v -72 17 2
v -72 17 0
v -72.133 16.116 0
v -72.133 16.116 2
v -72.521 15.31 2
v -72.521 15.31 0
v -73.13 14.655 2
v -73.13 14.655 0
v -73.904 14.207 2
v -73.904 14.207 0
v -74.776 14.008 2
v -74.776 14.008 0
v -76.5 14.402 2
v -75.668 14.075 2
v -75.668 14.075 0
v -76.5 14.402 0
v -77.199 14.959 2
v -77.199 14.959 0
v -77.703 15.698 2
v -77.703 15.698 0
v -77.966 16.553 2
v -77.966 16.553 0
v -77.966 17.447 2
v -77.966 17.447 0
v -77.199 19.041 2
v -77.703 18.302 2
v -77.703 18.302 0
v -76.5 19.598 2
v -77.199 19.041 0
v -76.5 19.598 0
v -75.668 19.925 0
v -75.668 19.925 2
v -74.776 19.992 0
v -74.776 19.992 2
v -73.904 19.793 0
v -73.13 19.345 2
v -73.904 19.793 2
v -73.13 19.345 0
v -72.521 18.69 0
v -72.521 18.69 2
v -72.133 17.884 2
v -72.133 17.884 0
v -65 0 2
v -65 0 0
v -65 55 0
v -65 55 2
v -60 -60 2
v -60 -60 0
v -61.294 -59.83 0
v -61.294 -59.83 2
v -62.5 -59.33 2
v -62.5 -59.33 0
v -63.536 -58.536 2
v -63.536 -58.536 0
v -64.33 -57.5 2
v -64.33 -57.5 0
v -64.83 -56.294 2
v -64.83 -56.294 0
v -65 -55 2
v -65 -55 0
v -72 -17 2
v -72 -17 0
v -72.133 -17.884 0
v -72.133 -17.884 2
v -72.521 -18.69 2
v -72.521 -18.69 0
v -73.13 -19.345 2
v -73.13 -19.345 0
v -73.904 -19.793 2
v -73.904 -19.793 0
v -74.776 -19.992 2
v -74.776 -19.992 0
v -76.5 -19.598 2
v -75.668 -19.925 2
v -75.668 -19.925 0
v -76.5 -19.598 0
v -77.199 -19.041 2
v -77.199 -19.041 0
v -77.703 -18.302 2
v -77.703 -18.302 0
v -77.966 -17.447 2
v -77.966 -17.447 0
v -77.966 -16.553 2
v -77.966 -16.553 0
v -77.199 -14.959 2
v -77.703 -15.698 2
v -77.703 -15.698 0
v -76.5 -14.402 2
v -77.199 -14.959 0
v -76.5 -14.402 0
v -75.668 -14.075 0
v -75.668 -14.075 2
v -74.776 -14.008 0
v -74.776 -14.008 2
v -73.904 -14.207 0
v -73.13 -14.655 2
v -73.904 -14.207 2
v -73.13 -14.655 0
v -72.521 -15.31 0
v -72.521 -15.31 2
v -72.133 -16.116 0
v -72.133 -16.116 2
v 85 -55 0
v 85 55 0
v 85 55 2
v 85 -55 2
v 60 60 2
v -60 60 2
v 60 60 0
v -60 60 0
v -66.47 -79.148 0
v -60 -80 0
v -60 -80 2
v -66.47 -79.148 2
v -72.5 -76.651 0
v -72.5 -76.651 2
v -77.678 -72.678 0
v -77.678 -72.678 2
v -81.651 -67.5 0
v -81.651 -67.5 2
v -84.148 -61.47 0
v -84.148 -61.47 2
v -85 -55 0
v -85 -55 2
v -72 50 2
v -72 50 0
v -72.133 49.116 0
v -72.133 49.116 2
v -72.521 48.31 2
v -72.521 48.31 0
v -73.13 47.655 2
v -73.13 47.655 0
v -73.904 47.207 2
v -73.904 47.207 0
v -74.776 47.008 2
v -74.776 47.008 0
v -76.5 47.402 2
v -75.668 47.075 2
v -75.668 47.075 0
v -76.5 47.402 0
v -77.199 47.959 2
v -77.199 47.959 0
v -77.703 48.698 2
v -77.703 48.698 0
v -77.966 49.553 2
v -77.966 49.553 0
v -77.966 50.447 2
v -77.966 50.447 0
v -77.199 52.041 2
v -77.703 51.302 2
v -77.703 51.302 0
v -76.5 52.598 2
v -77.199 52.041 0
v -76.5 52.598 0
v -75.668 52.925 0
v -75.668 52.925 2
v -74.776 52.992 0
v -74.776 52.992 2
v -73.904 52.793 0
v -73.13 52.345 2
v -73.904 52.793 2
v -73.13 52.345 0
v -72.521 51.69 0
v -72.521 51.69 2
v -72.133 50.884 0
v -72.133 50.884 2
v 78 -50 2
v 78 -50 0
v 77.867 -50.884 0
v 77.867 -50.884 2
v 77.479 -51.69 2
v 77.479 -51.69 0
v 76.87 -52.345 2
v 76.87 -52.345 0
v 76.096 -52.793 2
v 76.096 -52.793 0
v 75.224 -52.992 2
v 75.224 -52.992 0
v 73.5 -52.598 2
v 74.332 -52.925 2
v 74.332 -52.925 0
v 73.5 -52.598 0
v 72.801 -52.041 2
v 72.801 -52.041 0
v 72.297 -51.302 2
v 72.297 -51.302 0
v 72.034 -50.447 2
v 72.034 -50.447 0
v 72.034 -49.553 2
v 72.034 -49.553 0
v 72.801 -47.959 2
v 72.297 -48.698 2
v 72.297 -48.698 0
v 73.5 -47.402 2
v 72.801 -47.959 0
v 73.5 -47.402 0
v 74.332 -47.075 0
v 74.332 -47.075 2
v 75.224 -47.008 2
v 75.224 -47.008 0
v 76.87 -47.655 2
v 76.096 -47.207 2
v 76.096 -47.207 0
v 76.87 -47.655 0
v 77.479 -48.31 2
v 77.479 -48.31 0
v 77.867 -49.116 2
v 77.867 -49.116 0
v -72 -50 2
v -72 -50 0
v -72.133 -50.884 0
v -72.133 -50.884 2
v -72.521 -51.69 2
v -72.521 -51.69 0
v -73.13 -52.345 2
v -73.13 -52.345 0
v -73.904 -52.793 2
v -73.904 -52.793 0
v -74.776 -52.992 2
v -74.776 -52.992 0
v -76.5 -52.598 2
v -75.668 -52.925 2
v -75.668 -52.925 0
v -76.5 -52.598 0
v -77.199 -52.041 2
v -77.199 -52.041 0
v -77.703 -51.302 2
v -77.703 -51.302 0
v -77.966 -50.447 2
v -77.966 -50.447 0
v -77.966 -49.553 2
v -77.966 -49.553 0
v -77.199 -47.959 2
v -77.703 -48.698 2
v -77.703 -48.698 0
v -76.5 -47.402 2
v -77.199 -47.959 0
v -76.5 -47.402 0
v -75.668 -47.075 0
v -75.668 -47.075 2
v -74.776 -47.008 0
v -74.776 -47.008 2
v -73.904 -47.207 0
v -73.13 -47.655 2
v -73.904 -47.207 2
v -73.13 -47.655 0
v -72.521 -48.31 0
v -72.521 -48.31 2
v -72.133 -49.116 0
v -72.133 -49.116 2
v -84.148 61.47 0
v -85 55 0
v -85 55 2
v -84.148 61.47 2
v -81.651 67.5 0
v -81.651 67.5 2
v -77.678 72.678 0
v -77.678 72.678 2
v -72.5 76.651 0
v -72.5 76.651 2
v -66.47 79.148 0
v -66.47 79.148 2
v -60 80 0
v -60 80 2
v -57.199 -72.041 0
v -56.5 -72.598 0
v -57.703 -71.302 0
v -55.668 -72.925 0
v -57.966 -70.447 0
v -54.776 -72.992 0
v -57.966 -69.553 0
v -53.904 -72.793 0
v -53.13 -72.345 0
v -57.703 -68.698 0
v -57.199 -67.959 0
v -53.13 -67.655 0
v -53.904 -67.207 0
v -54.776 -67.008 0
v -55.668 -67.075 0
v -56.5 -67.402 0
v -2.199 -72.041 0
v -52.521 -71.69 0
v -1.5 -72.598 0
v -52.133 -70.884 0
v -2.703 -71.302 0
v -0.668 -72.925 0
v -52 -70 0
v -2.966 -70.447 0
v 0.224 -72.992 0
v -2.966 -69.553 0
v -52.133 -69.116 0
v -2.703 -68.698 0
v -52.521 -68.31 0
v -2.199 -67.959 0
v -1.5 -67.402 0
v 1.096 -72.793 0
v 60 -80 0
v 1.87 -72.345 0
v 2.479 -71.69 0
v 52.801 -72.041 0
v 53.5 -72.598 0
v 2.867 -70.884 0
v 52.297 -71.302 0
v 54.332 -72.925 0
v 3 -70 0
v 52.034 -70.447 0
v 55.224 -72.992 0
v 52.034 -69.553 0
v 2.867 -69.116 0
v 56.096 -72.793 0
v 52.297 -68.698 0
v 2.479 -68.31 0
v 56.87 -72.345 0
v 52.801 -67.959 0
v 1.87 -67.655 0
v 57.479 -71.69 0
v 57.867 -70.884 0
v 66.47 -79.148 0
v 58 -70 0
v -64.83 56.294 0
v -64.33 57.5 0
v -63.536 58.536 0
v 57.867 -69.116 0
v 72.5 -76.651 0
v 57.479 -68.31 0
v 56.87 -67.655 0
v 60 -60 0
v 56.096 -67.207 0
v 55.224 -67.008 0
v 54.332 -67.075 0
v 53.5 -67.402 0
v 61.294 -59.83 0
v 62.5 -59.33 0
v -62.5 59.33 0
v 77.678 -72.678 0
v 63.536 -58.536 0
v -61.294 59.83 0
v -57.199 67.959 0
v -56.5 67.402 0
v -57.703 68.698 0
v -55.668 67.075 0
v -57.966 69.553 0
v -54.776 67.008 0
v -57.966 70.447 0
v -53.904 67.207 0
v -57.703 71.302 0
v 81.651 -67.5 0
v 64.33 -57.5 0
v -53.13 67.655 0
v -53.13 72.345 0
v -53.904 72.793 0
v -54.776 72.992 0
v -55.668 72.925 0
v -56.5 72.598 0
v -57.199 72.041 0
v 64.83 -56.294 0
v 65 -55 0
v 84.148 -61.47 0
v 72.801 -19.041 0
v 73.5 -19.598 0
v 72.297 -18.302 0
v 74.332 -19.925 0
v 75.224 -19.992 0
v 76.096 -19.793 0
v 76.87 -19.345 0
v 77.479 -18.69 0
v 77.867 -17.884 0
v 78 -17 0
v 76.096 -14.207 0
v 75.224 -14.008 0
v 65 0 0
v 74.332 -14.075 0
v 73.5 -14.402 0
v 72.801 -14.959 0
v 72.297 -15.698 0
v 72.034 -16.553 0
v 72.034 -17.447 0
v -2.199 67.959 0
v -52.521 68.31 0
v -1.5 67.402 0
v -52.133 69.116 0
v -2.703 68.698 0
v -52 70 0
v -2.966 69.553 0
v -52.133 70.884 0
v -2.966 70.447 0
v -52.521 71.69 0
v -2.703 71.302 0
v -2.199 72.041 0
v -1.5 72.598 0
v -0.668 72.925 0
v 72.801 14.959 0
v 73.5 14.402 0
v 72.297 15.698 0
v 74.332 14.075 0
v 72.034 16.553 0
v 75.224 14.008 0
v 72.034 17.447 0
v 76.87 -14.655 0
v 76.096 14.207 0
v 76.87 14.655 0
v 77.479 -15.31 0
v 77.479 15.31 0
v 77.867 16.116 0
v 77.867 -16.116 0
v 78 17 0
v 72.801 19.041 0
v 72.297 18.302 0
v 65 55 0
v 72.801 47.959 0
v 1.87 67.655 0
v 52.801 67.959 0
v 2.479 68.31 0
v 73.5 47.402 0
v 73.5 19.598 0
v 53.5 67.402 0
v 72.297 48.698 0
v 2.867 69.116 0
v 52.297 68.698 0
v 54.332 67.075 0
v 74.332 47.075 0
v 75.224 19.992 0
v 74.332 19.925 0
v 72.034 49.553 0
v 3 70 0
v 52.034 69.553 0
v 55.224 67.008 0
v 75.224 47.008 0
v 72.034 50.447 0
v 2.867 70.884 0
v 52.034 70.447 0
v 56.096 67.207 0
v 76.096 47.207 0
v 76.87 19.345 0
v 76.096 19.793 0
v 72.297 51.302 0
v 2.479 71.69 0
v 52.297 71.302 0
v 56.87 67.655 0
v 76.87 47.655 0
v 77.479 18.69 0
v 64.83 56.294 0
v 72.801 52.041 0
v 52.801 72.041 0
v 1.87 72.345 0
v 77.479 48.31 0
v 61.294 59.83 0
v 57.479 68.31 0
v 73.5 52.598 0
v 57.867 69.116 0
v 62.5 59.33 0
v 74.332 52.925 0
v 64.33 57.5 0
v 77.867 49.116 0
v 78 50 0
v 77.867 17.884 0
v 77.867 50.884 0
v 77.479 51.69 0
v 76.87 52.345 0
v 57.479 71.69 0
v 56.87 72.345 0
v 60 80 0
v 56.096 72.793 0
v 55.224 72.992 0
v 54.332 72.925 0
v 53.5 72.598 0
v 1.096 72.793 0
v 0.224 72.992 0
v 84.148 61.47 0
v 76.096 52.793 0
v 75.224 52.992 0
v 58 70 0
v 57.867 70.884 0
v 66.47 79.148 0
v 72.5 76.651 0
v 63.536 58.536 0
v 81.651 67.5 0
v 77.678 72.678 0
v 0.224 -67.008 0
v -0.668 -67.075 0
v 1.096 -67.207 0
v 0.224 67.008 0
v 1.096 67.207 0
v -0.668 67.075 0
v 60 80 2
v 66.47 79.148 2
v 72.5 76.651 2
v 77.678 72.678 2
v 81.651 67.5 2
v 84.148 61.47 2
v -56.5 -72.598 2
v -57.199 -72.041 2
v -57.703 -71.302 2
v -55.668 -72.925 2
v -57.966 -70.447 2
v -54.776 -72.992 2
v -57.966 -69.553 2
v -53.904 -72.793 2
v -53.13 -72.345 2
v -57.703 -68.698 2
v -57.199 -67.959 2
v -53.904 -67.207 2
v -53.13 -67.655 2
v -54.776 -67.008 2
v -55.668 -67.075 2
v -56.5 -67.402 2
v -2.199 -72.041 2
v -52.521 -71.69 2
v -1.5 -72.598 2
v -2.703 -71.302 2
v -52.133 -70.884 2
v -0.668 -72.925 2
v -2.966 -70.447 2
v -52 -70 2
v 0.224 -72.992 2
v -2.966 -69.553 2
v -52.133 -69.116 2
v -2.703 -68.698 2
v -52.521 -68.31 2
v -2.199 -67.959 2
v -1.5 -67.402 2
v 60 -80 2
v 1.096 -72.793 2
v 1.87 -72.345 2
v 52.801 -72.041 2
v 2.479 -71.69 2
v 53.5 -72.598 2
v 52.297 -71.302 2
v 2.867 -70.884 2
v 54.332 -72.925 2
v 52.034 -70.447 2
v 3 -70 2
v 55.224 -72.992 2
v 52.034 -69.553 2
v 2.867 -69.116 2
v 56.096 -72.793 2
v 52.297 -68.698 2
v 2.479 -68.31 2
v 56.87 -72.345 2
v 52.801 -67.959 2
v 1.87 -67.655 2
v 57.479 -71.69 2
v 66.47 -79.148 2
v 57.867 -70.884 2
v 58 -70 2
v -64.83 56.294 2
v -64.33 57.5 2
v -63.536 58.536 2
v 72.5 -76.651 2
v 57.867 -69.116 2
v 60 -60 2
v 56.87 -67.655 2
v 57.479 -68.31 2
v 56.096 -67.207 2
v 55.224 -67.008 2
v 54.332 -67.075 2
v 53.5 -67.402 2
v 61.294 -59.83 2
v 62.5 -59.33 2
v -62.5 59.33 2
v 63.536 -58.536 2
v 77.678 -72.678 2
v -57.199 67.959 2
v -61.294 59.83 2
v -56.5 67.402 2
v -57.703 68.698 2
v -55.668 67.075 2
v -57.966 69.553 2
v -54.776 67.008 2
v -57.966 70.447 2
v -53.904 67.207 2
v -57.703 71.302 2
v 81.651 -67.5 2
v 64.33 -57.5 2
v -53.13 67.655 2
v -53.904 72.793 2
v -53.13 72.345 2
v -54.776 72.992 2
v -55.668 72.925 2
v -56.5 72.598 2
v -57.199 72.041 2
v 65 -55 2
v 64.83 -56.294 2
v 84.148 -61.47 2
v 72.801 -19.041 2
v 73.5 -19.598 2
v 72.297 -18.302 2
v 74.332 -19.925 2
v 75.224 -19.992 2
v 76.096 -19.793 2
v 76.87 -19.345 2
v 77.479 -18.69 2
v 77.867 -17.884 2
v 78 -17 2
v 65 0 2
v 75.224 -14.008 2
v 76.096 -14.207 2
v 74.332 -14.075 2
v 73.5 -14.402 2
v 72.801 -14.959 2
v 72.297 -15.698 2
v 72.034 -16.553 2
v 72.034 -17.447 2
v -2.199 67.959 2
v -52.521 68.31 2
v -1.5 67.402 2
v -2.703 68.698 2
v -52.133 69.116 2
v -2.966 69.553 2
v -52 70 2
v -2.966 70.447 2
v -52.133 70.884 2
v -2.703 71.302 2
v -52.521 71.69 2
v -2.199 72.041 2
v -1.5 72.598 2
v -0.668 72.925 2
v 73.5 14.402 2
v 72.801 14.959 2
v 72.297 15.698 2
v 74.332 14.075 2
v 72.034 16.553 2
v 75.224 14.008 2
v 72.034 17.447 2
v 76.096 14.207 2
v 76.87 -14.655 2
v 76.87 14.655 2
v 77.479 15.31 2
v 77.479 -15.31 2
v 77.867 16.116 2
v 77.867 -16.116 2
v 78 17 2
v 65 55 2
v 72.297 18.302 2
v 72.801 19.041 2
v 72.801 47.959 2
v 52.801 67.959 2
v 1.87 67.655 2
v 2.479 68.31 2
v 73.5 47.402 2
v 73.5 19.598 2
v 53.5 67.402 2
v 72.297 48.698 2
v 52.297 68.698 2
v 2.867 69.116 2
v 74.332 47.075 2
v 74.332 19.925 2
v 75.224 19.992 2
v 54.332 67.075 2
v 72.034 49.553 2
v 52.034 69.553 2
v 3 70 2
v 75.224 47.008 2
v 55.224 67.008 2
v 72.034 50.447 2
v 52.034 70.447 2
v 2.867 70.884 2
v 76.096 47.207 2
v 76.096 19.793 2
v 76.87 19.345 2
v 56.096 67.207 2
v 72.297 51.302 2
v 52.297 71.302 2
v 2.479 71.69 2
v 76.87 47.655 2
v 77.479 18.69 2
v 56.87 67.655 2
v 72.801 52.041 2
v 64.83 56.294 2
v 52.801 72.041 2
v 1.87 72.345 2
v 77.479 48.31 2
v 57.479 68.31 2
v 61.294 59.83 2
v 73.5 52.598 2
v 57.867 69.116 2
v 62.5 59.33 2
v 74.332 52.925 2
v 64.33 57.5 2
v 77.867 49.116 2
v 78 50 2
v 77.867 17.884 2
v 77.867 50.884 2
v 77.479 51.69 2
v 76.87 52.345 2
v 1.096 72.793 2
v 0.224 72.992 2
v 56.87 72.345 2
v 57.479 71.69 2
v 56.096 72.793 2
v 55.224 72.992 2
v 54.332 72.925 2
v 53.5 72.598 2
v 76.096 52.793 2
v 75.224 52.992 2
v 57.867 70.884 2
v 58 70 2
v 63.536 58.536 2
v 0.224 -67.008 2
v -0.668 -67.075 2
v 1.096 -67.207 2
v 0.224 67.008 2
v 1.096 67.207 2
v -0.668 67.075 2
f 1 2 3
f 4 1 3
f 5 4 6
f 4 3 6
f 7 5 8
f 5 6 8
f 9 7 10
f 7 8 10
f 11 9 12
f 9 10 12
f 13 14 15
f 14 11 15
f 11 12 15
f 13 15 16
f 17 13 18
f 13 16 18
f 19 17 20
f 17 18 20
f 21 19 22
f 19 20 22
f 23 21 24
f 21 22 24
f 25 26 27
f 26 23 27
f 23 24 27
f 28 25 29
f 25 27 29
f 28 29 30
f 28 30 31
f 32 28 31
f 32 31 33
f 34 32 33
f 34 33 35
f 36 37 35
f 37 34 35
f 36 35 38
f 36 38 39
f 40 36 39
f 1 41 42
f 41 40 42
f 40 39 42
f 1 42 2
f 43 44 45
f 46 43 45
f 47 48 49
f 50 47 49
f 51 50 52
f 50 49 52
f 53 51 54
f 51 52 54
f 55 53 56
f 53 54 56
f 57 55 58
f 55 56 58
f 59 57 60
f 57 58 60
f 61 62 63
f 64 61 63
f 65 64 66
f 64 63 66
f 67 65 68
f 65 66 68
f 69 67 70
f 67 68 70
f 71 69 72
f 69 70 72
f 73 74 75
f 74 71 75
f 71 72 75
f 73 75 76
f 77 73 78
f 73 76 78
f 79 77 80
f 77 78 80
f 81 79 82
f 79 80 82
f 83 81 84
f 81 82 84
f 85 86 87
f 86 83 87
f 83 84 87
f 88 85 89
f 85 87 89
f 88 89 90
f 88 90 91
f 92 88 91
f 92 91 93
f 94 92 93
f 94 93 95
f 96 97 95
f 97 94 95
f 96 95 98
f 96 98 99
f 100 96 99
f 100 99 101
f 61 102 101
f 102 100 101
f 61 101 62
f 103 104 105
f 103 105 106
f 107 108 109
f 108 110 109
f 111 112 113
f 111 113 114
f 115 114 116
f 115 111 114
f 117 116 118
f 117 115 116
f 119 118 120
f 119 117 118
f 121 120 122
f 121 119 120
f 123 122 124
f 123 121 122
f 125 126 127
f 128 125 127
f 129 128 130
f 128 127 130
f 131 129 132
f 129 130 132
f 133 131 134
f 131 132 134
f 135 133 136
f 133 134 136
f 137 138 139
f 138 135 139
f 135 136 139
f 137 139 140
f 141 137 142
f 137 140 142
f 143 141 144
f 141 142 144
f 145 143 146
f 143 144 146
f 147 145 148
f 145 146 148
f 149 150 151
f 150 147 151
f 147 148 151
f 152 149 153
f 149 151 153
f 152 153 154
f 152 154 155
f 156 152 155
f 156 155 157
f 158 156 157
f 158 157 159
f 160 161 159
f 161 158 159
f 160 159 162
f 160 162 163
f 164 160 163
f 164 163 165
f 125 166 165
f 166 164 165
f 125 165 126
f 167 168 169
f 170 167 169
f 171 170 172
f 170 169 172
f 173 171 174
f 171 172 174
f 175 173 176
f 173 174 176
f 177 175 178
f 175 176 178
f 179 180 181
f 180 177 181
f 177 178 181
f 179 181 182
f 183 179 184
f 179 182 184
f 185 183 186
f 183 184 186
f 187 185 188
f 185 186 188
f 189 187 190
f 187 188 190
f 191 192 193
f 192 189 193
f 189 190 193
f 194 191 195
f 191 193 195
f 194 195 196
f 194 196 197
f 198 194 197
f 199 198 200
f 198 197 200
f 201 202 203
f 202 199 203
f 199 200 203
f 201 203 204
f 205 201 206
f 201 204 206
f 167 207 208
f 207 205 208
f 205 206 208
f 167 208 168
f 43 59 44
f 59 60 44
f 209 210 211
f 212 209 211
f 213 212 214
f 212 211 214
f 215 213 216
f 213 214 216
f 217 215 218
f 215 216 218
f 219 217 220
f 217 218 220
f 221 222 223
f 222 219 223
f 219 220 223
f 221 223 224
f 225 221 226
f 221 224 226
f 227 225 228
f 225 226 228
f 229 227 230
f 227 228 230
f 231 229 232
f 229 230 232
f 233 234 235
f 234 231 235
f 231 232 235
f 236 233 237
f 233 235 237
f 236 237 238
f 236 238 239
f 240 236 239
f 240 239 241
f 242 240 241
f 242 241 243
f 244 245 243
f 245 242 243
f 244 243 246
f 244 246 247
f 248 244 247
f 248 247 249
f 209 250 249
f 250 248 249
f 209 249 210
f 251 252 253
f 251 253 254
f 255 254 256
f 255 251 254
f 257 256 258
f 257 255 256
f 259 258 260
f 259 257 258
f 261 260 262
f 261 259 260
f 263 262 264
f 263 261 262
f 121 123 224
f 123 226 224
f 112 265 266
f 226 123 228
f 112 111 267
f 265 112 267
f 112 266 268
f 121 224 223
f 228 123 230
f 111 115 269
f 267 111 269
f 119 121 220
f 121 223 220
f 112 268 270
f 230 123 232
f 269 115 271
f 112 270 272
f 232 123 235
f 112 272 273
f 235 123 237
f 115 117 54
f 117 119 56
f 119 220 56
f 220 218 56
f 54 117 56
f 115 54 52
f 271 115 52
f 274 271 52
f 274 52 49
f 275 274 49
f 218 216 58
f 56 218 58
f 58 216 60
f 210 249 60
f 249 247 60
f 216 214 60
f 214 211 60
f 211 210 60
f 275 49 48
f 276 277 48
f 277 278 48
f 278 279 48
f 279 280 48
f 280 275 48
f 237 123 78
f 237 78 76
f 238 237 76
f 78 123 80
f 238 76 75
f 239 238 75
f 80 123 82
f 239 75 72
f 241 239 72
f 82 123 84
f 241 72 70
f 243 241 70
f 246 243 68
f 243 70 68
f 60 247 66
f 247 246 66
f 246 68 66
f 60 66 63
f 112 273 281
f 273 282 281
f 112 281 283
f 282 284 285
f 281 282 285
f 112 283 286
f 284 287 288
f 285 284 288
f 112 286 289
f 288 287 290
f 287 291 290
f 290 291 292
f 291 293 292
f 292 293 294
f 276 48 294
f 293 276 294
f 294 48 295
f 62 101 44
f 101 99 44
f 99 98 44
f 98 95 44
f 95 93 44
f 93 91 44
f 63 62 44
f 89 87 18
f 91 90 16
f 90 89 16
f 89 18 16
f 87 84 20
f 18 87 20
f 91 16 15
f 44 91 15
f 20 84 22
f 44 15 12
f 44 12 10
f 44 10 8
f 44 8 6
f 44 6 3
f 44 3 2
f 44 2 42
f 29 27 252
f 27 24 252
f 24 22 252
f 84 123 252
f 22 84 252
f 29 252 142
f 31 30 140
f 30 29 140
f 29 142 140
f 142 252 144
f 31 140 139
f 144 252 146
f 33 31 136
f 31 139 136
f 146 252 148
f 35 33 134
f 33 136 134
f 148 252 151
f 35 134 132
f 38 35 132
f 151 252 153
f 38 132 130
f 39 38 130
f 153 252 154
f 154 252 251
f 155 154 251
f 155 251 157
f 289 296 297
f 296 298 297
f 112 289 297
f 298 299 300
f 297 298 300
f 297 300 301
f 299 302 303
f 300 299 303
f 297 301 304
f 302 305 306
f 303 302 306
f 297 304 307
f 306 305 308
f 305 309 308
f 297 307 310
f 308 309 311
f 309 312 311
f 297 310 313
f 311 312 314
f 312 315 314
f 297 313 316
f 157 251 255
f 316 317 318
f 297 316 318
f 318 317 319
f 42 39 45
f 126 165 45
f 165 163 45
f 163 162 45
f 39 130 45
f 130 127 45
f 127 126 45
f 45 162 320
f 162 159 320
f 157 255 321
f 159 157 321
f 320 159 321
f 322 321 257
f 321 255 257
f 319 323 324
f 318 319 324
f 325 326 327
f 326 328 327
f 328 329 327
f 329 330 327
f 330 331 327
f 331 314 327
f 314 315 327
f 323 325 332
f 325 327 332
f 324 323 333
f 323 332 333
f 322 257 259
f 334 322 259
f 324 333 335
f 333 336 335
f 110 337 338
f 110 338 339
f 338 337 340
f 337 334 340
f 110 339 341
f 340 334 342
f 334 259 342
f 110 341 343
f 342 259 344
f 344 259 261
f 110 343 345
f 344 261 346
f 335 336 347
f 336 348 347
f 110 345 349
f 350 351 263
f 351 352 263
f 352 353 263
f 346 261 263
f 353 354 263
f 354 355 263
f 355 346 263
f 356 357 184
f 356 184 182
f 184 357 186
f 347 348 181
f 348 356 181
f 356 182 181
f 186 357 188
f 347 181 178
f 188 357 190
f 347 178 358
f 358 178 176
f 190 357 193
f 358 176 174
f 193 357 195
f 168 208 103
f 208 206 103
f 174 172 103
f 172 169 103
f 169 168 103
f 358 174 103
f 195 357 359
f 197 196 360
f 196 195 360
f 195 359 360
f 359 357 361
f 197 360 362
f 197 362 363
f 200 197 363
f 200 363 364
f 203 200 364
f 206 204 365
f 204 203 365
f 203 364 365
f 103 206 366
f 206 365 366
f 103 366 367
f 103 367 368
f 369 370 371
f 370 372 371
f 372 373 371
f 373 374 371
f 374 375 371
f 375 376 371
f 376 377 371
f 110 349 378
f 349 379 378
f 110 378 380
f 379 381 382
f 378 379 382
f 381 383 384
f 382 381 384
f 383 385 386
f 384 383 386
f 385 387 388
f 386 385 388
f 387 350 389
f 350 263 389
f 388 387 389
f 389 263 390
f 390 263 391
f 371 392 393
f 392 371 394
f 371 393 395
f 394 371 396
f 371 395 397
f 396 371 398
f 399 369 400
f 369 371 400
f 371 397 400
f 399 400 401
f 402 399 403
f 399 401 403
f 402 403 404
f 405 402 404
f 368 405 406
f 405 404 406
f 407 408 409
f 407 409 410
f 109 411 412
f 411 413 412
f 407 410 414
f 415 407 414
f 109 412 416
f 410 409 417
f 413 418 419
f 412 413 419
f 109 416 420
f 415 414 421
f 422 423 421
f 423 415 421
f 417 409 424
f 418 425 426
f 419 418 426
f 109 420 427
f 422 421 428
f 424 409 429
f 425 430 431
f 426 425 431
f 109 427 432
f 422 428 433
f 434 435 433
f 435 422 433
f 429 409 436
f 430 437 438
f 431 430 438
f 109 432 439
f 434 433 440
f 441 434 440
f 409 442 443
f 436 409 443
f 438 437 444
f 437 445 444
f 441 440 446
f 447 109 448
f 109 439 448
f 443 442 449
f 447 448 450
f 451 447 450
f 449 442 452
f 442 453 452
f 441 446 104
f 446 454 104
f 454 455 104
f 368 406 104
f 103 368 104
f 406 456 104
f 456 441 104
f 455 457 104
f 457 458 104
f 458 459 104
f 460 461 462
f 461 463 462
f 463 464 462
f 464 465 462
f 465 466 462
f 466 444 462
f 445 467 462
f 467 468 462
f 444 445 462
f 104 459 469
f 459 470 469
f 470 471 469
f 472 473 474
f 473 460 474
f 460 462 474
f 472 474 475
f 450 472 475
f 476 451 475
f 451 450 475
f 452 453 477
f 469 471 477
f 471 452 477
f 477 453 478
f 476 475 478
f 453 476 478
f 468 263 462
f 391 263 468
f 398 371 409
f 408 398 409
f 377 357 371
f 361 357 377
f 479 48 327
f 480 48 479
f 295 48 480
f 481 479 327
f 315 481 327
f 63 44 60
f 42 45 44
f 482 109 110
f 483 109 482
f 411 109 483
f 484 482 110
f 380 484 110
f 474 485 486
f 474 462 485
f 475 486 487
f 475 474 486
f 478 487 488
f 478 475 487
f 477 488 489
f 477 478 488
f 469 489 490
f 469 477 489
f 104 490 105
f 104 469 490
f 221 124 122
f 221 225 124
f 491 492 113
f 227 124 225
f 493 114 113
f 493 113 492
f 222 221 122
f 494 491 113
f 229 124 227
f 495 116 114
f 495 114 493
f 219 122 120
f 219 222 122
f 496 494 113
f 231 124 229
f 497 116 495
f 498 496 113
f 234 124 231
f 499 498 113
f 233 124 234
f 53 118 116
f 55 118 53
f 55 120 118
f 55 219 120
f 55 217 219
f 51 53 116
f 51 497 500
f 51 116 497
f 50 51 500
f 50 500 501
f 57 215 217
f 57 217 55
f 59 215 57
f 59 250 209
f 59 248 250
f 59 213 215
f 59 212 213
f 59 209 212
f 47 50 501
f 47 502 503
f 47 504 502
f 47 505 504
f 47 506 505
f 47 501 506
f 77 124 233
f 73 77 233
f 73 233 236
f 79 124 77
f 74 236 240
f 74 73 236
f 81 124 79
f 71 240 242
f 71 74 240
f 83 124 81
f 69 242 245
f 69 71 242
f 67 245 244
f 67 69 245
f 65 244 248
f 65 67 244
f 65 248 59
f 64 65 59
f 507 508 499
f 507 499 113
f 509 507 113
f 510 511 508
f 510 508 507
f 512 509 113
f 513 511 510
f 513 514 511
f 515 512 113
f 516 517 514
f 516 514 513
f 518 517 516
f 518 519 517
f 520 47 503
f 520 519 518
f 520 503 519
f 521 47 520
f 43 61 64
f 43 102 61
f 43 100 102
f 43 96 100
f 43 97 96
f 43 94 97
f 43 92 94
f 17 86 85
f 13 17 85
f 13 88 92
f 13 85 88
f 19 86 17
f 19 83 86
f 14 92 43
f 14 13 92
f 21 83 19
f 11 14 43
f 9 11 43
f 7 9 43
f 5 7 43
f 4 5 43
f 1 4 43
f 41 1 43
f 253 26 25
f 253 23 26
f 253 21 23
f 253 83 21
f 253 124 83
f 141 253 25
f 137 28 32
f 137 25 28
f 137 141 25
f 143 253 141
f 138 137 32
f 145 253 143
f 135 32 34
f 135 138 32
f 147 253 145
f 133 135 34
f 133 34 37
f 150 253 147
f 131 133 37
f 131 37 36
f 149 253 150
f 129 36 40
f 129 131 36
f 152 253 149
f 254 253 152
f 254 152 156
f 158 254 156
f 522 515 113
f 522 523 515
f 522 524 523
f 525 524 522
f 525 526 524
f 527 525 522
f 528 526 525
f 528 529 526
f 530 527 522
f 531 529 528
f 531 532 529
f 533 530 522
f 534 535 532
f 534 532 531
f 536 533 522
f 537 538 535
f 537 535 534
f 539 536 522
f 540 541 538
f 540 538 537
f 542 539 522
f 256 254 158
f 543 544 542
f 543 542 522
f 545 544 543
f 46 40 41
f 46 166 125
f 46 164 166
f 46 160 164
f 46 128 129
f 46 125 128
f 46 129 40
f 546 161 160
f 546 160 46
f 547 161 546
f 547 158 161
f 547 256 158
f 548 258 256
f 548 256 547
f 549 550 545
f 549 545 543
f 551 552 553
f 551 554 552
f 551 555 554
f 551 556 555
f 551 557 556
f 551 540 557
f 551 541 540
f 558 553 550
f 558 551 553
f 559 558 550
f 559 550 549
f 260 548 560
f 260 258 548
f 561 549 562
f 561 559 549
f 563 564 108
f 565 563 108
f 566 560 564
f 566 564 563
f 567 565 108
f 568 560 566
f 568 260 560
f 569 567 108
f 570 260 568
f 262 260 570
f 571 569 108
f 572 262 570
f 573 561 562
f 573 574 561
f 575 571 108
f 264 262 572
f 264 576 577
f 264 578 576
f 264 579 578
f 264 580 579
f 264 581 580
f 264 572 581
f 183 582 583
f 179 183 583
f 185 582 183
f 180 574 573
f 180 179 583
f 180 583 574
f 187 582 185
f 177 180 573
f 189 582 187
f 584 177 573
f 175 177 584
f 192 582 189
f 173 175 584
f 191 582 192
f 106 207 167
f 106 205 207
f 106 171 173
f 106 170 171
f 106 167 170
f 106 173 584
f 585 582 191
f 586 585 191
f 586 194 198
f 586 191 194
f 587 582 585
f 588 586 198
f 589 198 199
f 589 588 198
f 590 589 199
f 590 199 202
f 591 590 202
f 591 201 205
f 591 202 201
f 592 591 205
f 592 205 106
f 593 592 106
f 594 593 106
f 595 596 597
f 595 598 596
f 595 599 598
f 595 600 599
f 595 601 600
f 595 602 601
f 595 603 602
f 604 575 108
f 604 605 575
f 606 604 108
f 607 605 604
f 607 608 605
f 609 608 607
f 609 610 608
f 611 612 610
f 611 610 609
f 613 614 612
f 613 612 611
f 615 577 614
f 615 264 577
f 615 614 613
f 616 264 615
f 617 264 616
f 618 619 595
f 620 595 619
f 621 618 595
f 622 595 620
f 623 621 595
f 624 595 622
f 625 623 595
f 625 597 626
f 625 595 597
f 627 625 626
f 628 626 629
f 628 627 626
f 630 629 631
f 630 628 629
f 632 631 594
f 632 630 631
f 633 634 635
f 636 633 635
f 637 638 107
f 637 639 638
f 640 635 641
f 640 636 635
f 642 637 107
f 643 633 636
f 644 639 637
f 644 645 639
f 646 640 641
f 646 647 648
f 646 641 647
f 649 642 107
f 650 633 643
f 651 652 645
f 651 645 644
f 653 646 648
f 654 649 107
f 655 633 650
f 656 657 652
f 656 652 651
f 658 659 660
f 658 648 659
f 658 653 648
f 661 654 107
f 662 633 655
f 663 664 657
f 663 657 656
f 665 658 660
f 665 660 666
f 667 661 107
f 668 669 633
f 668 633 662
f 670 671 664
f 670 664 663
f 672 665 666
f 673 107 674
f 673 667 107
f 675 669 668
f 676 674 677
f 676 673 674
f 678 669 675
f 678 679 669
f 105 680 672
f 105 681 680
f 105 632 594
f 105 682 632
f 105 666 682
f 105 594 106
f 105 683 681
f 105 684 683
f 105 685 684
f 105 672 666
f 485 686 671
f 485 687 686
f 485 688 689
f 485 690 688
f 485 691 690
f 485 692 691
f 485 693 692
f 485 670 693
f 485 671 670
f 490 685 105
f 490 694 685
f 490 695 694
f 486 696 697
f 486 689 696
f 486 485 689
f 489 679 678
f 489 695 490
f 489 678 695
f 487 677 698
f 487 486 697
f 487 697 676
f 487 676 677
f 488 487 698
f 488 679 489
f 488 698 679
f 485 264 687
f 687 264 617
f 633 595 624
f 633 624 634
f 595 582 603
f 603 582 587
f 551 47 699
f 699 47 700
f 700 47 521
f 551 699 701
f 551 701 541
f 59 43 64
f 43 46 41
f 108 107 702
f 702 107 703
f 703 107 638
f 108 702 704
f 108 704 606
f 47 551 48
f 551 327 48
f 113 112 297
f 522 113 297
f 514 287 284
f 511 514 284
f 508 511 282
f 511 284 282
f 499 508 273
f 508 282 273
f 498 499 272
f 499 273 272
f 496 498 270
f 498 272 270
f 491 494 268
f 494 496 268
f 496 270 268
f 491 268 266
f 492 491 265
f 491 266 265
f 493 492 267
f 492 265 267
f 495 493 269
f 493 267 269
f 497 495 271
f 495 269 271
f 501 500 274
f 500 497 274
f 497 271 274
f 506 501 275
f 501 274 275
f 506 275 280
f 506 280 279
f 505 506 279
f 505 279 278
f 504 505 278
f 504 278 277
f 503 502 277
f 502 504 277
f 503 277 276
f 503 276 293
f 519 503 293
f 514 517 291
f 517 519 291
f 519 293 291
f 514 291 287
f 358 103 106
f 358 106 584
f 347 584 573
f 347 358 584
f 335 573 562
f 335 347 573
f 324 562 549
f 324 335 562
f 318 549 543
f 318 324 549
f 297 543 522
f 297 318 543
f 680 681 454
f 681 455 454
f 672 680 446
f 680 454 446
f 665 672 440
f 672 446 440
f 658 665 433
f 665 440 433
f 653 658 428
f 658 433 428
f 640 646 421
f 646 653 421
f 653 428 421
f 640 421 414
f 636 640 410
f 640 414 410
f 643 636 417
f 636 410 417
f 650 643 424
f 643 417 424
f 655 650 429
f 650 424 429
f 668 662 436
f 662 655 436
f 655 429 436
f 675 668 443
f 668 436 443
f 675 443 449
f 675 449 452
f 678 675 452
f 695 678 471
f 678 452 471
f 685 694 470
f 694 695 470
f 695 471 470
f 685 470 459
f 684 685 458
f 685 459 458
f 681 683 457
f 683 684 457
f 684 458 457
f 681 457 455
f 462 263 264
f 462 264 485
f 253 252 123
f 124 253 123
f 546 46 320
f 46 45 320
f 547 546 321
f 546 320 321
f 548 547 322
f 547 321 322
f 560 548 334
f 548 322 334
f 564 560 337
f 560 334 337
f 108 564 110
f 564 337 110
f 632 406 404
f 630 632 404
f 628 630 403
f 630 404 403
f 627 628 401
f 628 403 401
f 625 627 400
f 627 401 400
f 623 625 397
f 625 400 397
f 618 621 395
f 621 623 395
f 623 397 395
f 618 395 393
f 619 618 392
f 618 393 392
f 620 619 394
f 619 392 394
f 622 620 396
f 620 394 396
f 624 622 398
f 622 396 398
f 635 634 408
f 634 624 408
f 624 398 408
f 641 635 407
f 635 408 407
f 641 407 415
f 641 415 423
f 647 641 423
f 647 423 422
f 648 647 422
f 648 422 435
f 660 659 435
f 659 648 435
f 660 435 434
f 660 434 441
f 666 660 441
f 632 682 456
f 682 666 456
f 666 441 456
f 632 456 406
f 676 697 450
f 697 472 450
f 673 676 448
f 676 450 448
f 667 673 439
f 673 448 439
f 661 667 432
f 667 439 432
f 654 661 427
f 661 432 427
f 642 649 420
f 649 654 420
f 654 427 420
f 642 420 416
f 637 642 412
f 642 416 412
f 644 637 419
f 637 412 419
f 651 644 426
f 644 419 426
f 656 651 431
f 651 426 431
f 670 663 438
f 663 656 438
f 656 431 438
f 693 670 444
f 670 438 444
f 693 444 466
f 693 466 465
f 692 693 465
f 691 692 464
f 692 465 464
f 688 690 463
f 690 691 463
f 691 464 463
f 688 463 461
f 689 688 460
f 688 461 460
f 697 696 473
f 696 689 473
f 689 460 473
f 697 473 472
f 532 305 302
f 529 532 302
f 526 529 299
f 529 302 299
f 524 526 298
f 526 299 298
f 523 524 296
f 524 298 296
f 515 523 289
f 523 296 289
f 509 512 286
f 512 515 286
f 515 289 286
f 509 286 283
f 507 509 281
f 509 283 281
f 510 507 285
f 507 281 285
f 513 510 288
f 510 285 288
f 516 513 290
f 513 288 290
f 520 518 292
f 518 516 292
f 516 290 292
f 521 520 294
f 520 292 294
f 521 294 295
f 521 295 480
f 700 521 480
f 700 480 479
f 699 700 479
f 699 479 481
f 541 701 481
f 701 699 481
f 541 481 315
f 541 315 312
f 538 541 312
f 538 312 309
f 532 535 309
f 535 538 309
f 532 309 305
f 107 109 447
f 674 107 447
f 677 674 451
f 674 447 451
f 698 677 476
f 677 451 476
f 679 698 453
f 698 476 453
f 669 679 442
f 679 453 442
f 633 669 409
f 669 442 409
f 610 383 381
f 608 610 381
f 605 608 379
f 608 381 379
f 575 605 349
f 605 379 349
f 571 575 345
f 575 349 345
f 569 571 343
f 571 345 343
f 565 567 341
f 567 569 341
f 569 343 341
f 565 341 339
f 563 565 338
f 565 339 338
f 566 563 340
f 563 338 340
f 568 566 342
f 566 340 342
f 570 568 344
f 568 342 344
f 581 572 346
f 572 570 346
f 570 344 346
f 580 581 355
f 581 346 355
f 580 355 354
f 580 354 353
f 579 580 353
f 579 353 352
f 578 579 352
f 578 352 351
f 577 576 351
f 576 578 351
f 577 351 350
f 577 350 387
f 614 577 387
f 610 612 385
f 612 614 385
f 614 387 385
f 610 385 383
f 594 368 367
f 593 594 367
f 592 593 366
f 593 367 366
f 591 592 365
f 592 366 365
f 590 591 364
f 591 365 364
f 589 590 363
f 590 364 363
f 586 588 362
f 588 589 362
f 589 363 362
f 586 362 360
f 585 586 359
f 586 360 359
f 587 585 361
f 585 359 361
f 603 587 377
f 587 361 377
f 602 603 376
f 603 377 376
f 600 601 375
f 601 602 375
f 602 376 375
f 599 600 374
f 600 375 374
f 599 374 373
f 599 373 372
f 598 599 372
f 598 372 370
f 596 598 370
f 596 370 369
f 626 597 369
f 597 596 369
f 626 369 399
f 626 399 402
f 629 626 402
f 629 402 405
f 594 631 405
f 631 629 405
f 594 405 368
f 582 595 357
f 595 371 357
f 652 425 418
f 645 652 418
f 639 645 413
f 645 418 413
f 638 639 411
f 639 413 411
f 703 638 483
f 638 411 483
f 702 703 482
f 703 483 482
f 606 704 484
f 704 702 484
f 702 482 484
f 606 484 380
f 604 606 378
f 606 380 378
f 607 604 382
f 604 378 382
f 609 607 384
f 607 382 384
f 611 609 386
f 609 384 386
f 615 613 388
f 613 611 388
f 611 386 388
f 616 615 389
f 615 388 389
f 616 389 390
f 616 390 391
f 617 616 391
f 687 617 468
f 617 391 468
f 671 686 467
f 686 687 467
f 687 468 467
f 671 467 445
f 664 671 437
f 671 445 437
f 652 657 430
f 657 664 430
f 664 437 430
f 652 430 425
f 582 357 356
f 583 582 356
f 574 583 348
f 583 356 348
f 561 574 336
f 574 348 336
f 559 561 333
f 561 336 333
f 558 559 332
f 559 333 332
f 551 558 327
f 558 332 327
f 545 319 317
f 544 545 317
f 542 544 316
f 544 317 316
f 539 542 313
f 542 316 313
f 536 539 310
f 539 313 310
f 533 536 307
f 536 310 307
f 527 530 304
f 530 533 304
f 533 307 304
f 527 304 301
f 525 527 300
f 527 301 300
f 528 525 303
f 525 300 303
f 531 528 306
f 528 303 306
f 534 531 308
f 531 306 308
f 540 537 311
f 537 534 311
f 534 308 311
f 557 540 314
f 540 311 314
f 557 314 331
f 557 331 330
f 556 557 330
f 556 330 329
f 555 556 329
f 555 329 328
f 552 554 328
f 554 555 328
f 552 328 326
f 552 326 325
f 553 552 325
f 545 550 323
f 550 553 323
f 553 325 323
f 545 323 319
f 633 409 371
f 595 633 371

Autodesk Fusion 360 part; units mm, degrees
sketch "Sketch1" plane through (0, 0, 0) normal (0, 0, 1) x (1, 0, 0)
  line L0 (-65, 0) -> (65, 0)
  line L1 (-60, 60) -> (60, 60)
  line L2 (65, 55) -> (65, -55)
  line L3 (60, -60) -> (-60, -60)
  line L4 (-65, -55) -> (-65, 55)
  line L5 (-65, 60) -> (65, -60) construction
  line L6 (65, 60) -> (-65, -60) construction
  line L7 (-65, 0) -> (-85, 0) construction
  circle A0 centre (-75, 0) radius 3
  line L8 (0, 2.5) -> (0, 20) construction
  line L9 (65, 0) -> (85, 0) construction
  circle A1 centre (75, 0) radius 3
  line L10 (0, 60) -> (0, 80) construction
  circle A2 centre (0, 70) radius 3
  line L11 (20, 0) -> (2.5, 0)
  circle A3 centre (0, -70) radius 3
  line L12 (0, -60) -> (0, -80) construction
  circle A4 centre (-75, -50) radius 3
  circle A5 centre (-75, 50) radius 3
  circle A6 centre (75, 50) radius 3
  circle A7 centre (75, -50) radius 3
  circle A8 centre (-55, 70) radius 3
  circle A9 centre (55, 70) radius 3
  circle A10 centre (-55, -70) radius 3
  circle A11 centre (55, -70) radius 3
  line L13 (-85, 55) -> (-85, -55)
  line L14 (85, 55) -> (85, -55)
  line L15 (-60, 80) -> (60, 80)
  line L16 (-60, -80) -> (60, -80)
  circle A12 centre (49.5242, -49.6041) radius 2.5
  circle A13 centre (-0.0023, -49.6041) radius 2.5
  circle A14 centre (-49.5289, -49.6041) radius 2.5
  circle A15 centre (49.5242, 49.6459) radius 2.5
  circle A16 centre (-0.0023, 49.6459) radius 2.5
  circle A17 centre (-49.5289, 49.6459) radius 2.5
  arc A18 (-65, -55) -> (-60, -60) centre (-60, -55) ccw
  arc A19 (-60, 60) -> (-65, 55) centre (-60, 55) ccw
  arc A20 (65, 55) -> (60, 60) centre (60, 55) ccw
  arc A21 (60, -60) -> (65, -55) centre (60, -55) ccw
  line L17 (-75, 0) -> (-75, 17) construction
  line L18 (-75, 0) -> (-75, -17) construction
  circle A22 centre (-75, -17) radius 3
  circle A23 centre (-75, 17) radius 3
  circle A24 centre (75, -17) radius 3
  circle A25 centre (75, 17) radius 3
  line L19 (75, 0) -> (75, 17) construction
  line L20 (75, 0) -> (75, -17) construction
  arc A26 (-85, -55) -> (-60, -80) centre (-60, -55) ccw
  arc A27 (60, -80) -> (85, -55) centre (60, -55) ccw
  arc A28 (85, 55) -> (60, 80) centre (60, 55) ccw
  arc A29 (-60, 80) -> (-85, 55) centre (-60, 55) ccw
  point P0 (-65, 0)
  point P1 (-85, 80)
  point P2 (-85, -80)
  point P3 (85, -80)
  point P4 (85, 80)
  point P5 (-65, -80)
  point P6 (-85, -60)
  point P7 (-65, 80)
  point P8 (-85, 60)
  point P9 (65, 80)
  point P10 (85, 60)
  point P11 (85, -60)
  point P12 (65, -80)
  dimension "d30" = 65
  dimension "d31" = 130
  dimension "d32" = 120
  dimension "d33" = 20
  dimension "d34" = 6
  dimension "d35" = 20
  dimension "d36" = 6
  dimension "d39" = 0
  dimension "d40" = 50
  dimension "d43" = 55
  dimension "d44" = 0
  dimension "d45" = 5
  dimension "d46" = 5
  dimension "d47" = 5
  dimension "d48" = 20
  dimension "d49" = 20
  dimension "d50" = 20
  dimension "d51" = 20
  dimension "d52" = 20
  dimension "d53" = 20
  dimension "d54" = 20
  dimension "d55" = 20
  dimension "d56" = 5
  dimension "d60" = 17
  dimension "d63" = 0
  dimension "d64" = 17
  dimension "d65" = 25
extrude "Extrude1" add sketch "Sketch1" along normal blind 2 contours A0 | A1 | L13 L14 L15 L16 A26 A27 A28 A29
equation "d31 = 65 mm + 65 mm"
equation "d49 = d48"
equation "d51 = d50"
equation "d53 = d52"
equation "d55 = d54"
